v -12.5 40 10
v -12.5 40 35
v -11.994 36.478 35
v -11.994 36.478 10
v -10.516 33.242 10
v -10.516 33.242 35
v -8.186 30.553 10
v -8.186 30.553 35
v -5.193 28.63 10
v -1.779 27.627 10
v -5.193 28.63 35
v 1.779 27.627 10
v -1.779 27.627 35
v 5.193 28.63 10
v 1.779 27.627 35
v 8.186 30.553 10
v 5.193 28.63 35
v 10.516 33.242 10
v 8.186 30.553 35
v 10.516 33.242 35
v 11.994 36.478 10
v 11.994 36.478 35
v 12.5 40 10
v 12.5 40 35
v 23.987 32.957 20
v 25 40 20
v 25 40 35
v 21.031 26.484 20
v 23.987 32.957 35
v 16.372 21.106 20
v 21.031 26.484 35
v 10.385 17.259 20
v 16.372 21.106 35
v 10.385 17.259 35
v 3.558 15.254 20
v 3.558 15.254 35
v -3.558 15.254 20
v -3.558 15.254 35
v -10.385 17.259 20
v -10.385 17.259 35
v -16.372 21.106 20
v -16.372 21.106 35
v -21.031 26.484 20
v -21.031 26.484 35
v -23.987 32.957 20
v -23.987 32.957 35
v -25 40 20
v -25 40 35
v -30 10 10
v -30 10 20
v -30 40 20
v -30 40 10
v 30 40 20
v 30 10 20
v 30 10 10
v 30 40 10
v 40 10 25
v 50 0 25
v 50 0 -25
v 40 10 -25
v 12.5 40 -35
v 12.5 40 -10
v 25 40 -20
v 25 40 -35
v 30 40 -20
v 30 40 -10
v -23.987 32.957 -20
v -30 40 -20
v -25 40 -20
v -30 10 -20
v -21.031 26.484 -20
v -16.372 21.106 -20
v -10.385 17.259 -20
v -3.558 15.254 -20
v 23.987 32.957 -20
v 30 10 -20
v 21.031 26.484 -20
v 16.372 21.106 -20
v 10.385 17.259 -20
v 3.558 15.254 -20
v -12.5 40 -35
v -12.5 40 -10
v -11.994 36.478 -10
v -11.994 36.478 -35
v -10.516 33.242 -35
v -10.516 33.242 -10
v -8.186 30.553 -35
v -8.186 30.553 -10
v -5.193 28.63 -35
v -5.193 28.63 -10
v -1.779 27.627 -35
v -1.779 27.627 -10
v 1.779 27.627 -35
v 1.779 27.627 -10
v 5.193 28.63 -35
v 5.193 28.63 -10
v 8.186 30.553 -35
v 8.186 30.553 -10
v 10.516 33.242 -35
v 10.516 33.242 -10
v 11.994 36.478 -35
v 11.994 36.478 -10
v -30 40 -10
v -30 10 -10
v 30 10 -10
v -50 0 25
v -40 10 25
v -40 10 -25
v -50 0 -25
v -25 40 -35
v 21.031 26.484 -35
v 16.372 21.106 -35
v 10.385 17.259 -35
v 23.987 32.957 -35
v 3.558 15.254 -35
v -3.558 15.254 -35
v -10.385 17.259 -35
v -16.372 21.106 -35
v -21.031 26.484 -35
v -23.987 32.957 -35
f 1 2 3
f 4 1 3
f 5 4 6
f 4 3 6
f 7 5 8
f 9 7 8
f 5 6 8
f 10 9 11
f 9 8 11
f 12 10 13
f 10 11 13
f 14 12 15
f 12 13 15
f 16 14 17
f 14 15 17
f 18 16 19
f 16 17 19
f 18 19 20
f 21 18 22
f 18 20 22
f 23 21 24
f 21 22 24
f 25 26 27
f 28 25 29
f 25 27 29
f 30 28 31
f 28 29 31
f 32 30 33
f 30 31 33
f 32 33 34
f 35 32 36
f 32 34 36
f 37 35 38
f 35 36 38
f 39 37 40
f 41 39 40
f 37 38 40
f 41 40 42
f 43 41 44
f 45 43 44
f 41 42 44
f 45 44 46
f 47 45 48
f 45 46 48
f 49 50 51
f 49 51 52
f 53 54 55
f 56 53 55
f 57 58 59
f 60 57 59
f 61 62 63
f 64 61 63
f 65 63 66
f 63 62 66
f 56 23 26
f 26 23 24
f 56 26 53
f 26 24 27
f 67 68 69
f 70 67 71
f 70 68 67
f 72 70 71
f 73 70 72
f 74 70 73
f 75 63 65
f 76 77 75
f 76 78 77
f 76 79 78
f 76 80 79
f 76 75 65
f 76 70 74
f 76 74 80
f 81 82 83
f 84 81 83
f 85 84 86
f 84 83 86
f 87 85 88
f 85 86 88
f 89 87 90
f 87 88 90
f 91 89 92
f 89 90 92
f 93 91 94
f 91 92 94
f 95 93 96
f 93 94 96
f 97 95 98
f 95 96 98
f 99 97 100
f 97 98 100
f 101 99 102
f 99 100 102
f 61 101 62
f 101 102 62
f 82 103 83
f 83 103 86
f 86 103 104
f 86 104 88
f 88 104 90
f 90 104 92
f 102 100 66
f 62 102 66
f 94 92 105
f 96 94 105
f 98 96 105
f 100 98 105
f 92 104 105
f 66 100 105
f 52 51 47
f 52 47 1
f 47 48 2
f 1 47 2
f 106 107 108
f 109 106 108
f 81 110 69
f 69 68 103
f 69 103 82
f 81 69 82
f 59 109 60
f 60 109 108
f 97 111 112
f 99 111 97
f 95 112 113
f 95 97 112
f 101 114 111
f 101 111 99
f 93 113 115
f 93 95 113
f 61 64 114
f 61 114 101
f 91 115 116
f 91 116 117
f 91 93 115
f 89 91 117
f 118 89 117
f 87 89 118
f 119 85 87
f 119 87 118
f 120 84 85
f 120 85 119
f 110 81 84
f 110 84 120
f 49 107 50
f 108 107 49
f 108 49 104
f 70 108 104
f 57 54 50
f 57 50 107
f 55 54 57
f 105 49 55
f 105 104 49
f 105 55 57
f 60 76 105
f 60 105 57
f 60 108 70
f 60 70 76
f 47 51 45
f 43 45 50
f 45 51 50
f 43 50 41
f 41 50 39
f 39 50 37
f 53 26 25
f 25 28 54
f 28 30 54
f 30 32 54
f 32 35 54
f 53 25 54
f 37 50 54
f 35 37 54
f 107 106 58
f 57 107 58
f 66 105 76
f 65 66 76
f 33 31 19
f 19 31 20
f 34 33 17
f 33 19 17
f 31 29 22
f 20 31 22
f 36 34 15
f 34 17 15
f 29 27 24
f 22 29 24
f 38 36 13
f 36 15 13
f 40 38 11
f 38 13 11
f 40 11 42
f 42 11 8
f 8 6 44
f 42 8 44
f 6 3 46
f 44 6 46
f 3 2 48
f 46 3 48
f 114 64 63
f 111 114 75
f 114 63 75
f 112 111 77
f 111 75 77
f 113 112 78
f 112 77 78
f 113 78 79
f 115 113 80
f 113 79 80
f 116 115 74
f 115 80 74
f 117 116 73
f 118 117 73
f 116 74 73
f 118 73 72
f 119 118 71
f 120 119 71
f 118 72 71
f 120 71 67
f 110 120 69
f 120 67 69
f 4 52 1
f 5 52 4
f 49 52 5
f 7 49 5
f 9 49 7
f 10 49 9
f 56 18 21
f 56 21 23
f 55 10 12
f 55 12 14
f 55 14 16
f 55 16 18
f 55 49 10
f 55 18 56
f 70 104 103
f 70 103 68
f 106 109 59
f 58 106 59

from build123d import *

# Parameters (mm, degrees)
SKETCH1_W           = 100
SKETCH1_H           = 50
BOSS_EXTRUDE1_DEPTH = 10
CHAMFER1_SIZE       = 10
CHAMFER2_SIZE       = 10
SKETCH2_W           = 60
SKETCH2_H           = 10
BOSS_EXTRUDE3_DEPTH = 40
CUT_EXTRUDE1_DEPTH  = 64
BOSS_EXTRUDE5_START = 15
BOSS_EXTRUDE5_DEPTH = 15
BOSS_EXTRUDE6_DEPTH = 15


with BuildPart() as part:
    # Sketch1 → Boss-Extrude1 (new body)
    with BuildSketch(Plane(origin=(0, 0, 0), x_dir=(1, 0, 0), z_dir=(0, 1, 0))):
        Rectangle(SKETCH1_W, SKETCH1_H)
    extrude(amount=BOSS_EXTRUDE1_DEPTH)

    # Chamfer1
    chamfer1_edges = [part.edges().sort_by_distance(p)[0] for p in [
        (-50, 10, 0),
    ]]
    chamfer(chamfer1_edges, length=CHAMFER1_SIZE - 0.0001)  # a hair under: the kernel refuses the full size

    # Chamfer2
    chamfer2_edges = [part.edges().sort_by_distance(p)[0] for p in [
        (50, 10, 0),
    ]]
    chamfer(chamfer2_edges, length=CHAMFER2_SIZE - 0.0001)  # a hair under: the kernel refuses the full size

    # Sketch2 → Boss-Extrude3 (add)
    with BuildSketch(Plane(origin=(0, 0, 0), x_dir=(1, 0, 0), z_dir=(0, 1, 0))):
        with Locations((0, -15)):
            Rectangle(SKETCH2_W, SKETCH2_H)
        with Locations((0, 15)):
            Rectangle(SKETCH2_W, SKETCH2_H)
    extrude(amount=BOSS_EXTRUDE3_DEPTH)

    # Sketch4 → Cut-Extrude1 (cut)
    with BuildSketch(Plane.XY.offset(20)):
        with BuildLine():
            Line((-12.5, 40), (12.5, 40))
            ThreePointArc((12.5, 40), (0, 27.5), (-12.5, 40))
        make_face()
    extrude(amount=-CUT_EXTRUDE1_DEPTH, mode=Mode.SUBTRACT)

    # Sketch10 → Boss-Extrude5 (add)
    with BuildSketch(Plane.XY.offset(20).offset(BOSS_EXTRUDE5_START)):
        with BuildLine():
            Line((-25, 40), (-12.5, 40))
            ThreePointArc((-12.5, 40), (0, 27.5), (12.5, 40))
            Line((12.5, 40), (25, 40))
            ThreePointArc((25, 40), (0, 15), (-25, 40))
        make_face()
    extrude(amount=-BOSS_EXTRUDE5_DEPTH)

    # Sketch11 → Boss-Extrude6 (add)
    with BuildSketch(Plane(origin=(0, 0, -20), x_dir=(-1, 0, 0), z_dir=(0, 0, -1))):
        with BuildLine():
            Line((-12.5, 40), (-25, 40))
            ThreePointArc((-25, 40), (0, 15), (25, 40))
            Line((25, 40), (12.5, 40))
            ThreePointArc((12.5, 40), (0, 27.5), (-12.5, 40))
        make_face()
    extrude(amount=BOSS_EXTRUDE6_DEPTH)


solid = part.part
